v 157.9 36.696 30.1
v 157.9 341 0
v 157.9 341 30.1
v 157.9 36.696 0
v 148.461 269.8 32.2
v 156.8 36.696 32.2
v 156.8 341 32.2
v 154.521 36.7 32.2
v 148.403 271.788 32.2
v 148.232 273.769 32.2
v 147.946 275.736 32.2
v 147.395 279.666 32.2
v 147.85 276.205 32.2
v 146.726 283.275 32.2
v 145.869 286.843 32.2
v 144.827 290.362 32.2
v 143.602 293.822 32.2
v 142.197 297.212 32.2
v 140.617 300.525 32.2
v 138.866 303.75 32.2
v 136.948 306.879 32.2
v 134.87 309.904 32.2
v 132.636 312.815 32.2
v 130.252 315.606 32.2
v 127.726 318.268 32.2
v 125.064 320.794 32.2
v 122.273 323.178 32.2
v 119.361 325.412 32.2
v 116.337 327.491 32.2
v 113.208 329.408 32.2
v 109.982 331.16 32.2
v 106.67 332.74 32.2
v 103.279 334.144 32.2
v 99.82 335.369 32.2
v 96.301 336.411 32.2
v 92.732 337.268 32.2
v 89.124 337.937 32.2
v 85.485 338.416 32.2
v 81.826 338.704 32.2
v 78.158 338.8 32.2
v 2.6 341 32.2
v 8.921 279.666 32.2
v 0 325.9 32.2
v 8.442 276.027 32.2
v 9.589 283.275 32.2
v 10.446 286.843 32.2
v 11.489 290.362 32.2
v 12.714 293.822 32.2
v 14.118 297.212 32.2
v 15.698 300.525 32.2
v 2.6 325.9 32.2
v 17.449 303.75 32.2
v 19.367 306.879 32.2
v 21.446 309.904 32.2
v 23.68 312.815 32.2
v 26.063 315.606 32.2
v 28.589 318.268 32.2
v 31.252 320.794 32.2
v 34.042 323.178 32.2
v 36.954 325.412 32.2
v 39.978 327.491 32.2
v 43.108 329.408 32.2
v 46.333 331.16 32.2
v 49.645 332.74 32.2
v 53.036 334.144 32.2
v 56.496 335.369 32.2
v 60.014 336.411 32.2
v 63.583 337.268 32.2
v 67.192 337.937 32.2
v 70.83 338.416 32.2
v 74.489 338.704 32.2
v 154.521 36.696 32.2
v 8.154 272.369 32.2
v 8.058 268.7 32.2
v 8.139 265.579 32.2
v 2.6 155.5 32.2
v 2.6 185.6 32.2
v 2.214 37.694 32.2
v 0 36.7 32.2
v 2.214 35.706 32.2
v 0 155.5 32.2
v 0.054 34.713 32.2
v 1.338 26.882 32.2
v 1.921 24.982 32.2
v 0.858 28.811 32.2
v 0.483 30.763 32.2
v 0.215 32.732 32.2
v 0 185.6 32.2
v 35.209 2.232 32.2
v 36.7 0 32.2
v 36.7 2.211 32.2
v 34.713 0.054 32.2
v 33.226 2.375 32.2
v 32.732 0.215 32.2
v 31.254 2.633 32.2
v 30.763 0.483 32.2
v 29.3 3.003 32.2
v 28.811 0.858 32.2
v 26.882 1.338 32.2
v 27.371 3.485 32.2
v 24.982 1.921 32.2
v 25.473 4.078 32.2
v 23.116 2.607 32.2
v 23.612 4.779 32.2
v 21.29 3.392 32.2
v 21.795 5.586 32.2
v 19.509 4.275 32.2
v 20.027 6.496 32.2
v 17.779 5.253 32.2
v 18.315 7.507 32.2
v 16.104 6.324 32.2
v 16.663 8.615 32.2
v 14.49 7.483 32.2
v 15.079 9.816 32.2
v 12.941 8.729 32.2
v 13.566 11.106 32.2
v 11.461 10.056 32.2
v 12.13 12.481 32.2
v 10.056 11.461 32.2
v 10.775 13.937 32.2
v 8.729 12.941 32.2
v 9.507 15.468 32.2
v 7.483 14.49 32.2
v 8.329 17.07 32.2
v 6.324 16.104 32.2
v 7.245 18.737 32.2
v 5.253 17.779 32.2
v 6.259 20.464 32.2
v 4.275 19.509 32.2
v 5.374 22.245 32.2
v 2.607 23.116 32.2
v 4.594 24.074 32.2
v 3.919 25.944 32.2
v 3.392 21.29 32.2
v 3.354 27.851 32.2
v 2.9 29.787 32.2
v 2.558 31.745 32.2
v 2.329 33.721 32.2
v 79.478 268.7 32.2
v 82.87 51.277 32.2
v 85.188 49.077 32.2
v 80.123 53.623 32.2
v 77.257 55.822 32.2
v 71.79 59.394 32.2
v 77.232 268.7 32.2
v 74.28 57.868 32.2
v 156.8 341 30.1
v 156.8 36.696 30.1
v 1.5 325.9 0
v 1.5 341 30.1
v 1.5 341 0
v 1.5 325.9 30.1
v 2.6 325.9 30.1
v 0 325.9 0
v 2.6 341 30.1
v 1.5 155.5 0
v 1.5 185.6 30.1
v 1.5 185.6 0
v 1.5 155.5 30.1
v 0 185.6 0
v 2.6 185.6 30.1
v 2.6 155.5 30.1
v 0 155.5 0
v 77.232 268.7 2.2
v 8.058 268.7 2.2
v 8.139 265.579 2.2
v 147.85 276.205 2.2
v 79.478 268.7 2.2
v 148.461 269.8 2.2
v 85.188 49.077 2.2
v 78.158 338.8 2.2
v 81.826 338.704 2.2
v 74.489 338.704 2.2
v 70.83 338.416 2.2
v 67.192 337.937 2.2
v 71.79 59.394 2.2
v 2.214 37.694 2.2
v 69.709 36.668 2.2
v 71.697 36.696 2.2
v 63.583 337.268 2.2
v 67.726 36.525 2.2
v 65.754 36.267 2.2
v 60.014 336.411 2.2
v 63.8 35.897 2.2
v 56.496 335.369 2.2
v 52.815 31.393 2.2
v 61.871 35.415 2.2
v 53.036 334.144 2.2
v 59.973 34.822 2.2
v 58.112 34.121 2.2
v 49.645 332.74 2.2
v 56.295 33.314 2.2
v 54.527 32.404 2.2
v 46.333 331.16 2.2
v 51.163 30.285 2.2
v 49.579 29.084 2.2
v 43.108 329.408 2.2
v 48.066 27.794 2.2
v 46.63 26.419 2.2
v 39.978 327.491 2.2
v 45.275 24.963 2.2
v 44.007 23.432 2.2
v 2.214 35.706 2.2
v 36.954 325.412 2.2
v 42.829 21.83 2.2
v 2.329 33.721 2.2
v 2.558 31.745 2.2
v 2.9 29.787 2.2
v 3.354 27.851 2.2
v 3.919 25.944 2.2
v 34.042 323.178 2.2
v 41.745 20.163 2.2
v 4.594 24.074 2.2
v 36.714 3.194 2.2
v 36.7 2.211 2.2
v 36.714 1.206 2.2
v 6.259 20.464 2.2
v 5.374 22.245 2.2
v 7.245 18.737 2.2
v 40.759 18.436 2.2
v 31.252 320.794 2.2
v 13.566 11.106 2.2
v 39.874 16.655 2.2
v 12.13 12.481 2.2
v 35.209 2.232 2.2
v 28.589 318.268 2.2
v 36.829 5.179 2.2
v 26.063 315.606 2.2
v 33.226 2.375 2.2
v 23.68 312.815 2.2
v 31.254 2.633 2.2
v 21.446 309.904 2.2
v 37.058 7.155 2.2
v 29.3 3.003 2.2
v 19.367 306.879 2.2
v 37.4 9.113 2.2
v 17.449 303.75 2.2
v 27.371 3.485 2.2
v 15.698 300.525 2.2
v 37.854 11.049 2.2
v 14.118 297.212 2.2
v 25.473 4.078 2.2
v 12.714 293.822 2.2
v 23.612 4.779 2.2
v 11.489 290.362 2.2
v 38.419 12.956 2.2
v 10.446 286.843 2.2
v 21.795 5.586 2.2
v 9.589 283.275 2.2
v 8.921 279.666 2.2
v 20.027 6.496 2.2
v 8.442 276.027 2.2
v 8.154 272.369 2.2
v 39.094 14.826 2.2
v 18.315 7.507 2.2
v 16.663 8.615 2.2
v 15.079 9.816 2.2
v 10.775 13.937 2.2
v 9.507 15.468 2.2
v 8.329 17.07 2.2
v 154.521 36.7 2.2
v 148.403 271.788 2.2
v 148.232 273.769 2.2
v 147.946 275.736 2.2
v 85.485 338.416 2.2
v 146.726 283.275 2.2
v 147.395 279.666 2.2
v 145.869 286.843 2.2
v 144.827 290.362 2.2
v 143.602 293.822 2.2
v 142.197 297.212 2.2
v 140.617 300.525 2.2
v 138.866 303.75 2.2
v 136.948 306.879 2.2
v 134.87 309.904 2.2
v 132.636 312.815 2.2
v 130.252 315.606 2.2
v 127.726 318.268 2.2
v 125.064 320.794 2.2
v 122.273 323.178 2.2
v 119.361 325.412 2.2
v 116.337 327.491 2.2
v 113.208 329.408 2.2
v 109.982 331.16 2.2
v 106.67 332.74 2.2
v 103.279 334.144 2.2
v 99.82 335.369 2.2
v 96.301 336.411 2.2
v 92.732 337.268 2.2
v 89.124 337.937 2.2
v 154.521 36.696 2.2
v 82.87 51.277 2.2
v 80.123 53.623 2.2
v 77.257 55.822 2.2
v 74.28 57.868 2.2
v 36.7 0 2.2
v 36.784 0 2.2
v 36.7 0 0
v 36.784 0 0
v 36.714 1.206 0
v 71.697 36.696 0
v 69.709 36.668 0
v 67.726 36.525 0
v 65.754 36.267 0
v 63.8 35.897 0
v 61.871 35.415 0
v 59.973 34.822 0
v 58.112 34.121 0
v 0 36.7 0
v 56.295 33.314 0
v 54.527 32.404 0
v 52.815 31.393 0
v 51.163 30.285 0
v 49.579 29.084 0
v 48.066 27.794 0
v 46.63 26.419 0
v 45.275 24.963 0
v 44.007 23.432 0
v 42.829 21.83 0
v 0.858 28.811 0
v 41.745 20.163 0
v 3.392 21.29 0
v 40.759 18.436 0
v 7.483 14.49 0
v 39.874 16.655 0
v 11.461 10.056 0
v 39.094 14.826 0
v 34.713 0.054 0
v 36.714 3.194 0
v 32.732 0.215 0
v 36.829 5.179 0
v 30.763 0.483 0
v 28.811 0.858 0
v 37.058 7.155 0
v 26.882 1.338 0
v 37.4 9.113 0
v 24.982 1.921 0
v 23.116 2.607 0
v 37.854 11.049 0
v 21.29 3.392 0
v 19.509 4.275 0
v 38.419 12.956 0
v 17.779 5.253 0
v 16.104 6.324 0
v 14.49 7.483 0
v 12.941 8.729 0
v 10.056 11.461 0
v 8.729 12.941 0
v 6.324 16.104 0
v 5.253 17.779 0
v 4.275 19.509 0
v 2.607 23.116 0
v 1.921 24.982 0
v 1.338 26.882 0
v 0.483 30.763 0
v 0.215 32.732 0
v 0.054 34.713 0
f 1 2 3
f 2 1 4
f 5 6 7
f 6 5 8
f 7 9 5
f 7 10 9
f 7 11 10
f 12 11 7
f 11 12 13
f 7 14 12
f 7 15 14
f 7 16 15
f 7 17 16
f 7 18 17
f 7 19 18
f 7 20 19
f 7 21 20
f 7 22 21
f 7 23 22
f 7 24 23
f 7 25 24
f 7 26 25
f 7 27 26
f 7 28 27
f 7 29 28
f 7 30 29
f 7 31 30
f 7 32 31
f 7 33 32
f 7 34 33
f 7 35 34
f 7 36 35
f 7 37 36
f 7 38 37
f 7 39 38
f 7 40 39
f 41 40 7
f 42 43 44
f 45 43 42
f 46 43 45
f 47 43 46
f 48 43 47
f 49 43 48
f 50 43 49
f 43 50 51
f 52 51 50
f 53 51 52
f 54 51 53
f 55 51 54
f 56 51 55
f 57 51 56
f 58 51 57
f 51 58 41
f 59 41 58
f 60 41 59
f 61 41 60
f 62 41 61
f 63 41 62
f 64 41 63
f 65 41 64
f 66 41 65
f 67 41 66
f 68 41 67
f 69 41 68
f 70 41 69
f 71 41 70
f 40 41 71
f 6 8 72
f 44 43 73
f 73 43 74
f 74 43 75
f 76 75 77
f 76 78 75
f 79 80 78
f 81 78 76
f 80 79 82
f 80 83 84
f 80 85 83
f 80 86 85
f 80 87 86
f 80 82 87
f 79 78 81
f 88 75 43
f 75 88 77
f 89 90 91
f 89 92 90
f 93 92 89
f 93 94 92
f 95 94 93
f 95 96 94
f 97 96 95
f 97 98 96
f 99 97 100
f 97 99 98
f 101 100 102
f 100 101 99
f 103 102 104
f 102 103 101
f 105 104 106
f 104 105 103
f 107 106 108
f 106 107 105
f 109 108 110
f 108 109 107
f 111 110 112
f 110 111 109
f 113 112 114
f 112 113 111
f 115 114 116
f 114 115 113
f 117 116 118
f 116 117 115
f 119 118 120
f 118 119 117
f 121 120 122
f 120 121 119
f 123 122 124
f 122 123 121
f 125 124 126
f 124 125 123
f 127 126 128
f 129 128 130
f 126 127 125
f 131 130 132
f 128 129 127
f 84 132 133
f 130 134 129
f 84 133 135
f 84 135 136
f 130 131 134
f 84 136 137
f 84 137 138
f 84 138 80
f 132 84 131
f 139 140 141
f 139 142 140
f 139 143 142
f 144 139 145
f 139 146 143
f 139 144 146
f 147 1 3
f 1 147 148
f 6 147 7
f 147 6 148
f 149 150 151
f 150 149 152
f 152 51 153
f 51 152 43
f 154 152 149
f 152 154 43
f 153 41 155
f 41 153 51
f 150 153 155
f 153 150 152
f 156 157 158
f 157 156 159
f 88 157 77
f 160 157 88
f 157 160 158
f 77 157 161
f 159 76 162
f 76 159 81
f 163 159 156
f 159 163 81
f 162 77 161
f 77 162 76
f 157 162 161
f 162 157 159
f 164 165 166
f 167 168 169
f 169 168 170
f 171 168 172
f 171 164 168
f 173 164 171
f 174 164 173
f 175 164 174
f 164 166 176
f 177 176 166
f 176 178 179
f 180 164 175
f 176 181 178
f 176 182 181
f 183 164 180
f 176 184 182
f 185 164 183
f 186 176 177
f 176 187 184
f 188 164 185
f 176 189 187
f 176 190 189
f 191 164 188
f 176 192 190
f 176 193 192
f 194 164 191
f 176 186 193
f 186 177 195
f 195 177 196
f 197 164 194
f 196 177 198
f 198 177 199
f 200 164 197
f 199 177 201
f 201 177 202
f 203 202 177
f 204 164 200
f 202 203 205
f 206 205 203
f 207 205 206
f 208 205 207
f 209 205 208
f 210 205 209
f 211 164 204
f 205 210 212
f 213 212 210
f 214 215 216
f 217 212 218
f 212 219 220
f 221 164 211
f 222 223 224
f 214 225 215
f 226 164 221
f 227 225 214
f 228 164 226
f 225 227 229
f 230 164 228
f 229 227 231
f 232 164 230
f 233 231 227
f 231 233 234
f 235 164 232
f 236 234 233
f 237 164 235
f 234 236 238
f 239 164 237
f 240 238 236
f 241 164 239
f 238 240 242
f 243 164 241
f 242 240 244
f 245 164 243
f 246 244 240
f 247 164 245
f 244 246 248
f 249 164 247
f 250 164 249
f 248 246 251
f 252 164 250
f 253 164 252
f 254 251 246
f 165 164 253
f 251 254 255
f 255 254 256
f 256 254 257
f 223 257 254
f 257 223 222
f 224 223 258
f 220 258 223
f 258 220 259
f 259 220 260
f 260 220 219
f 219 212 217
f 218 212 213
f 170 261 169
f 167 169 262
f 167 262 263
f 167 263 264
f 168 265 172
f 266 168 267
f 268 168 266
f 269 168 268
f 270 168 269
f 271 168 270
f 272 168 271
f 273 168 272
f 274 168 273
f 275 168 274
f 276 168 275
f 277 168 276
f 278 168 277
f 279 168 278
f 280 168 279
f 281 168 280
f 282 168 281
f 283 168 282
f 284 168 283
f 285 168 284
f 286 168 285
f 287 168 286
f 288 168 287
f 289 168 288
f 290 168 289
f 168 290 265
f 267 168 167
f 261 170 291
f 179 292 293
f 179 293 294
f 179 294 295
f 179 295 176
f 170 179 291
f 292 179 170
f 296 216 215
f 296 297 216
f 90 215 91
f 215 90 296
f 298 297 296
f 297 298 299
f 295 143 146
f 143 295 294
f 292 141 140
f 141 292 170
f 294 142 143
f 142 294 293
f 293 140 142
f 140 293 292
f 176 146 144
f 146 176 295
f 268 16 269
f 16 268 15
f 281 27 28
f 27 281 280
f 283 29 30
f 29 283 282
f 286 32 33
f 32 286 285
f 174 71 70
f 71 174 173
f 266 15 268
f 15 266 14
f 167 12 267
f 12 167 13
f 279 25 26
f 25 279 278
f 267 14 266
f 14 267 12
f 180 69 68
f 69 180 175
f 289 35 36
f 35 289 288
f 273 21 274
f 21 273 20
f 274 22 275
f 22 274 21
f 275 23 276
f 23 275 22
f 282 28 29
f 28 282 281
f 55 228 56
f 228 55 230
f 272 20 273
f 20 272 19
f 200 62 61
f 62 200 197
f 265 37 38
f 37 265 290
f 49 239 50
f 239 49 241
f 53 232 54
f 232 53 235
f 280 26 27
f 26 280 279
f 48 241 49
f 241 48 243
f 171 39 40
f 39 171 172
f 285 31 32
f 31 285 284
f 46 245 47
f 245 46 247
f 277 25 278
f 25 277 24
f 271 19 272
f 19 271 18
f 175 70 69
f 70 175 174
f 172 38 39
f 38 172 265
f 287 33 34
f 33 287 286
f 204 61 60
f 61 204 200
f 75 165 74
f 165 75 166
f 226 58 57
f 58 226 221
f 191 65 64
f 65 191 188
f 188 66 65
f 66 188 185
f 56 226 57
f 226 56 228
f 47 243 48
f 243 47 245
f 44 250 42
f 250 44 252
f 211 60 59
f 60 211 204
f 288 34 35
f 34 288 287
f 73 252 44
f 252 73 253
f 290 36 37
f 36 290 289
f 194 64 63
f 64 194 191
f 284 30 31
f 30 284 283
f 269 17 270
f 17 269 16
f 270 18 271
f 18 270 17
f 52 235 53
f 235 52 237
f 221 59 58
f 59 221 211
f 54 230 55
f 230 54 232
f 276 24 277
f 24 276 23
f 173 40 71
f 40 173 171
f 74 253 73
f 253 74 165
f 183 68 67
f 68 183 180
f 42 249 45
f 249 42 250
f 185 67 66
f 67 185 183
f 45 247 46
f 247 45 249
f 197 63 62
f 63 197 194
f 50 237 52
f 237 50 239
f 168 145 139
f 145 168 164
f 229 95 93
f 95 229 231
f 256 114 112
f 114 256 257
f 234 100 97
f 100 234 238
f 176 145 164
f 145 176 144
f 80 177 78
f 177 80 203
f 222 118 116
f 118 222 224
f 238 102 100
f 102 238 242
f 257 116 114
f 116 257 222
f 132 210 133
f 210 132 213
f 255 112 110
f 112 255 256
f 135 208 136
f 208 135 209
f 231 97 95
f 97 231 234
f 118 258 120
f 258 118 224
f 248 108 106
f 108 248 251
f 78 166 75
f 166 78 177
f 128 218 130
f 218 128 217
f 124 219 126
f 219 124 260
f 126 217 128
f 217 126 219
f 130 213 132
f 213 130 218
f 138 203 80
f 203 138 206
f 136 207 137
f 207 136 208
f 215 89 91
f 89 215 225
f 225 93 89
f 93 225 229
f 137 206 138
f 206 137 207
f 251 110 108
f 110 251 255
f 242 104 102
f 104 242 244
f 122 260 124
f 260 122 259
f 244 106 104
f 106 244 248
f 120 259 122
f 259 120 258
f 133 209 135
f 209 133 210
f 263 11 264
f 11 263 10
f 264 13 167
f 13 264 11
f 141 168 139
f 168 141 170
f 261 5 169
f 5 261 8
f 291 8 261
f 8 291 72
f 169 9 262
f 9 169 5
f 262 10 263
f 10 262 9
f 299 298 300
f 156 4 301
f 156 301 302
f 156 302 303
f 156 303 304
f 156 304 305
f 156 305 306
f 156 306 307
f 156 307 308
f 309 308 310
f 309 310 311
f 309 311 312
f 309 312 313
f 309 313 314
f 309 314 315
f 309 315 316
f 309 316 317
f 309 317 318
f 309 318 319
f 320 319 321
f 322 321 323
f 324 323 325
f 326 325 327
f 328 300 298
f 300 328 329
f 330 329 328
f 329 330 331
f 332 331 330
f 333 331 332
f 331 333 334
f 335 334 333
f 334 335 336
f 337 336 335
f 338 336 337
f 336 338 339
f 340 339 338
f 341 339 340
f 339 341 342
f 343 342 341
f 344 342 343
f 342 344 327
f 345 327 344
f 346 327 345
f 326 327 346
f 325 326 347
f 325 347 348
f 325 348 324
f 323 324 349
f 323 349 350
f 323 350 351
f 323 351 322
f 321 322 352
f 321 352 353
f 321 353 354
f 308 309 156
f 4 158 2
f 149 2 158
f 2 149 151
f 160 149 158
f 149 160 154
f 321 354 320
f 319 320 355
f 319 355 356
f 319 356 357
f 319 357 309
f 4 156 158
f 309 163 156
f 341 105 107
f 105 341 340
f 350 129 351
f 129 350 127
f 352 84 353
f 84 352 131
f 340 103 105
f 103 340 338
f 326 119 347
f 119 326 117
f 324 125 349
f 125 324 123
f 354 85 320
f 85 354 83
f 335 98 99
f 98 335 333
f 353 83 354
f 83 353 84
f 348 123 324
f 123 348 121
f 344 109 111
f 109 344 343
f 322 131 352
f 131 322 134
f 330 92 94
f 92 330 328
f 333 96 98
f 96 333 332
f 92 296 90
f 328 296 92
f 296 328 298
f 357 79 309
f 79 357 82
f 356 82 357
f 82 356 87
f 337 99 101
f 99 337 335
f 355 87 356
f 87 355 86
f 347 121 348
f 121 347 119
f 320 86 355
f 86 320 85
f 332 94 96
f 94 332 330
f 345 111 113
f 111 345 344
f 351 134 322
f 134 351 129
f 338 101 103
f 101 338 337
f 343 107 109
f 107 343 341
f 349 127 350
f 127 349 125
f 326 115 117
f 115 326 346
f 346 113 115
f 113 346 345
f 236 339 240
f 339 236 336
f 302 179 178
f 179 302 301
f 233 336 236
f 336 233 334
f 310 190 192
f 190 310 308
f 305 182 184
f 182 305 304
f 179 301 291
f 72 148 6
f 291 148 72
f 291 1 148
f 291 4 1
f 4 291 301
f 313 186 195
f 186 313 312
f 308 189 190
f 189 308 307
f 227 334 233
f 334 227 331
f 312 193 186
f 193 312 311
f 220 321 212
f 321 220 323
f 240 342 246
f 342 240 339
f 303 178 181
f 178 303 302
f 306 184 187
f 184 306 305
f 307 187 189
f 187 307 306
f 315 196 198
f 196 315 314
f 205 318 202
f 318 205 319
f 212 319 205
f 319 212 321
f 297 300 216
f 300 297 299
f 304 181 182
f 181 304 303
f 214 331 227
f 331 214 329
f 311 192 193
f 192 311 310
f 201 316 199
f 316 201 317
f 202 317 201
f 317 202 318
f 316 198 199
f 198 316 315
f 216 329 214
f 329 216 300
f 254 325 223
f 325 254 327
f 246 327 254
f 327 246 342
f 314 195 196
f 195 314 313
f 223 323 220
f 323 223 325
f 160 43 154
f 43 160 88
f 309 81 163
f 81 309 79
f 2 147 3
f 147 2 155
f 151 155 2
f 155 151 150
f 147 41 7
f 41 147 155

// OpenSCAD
/*
FourOhFour
2018-03-08

License: http://creativecommons.org/licenses/by-sa/4.0/

A can dispenser for your fridge. Print two sides (mirror one in your slicer), one set of supports for the bottom, and a top shelf. Half sides and top provided if, like me, you don't have a large printer. If you aren't going to place items on top of the dispenser, you can save some plastic and replace the top shelf with another set of supports.

*/

/* [Can Dimensions] */
// Diameter of the can, mm
can_diameter = 67;

// Height of the can, mm
can_height = 123;

// How far from the edge should the can be supported, mm
can_support_height = 30;

/* [Dispenser Dimensions] */
// depth of dispenser, mm
depth = 341;

// height of dispenser, mm
height=160;

// how far from the front does the top shelf begin, mm
shelf_y = 100;

// which object?
part = "fullside"; // [fullside:Entire side piece, frontside:Front half of side, rearside:Rear half of side, supports, top, halftop:Half of top, topcutout:STL for slic3r to make top for full top mesh, halftopcutout:STL for top mesh for half top]

/* [Rear Notch] */
//notch out the bottom rear corner to avoid a rim on the fridge shelf?
should_notch_rear = false;
rear_notch_height = 33;
rear_notch_depth = 9;


/* [Nitpicky Details] */
// min wall thickness, mm
wall_thickness = 2.2;

// top shelf thickness, mm
top_thickness = 2;

// size of the bottom braces, mm
bottom_brace_width = 15;

// bottom brace thickness, mm
bottom_brace_thickness = 1.4;

// slope of ramps, percent
slope_angle = .026;

// extra space in assembly slots, mm
assembly_slack = .10;

// extra thickness for the middle of bottom braces and top, mm
brace_middle_addl_thickness = 1;

// how much should the thicker middle overlap the sides, mm
brace_middle_extra_width = 2;

// ammount to add to the size of the can, mm
slack = 2;

// render quality, lower better, min 0.01 def 12
$fa = 3;

track_radius = (can_diameter + slack) / 2;

module can_track(slope_dir) {
  y = depth - 3*track_radius - 2*wall_thickness;
  hull() {
    cylinder(h=can_support_height, r=track_radius);
    translate(
      [y * slope_angle * slope_dir,
      y,
      0]
    ) {
      cylinder(h=can_support_height+.1, r = track_radius);
      // adding some to height to make the preview render better
    }
  }
}

module support_inset(y, face) {
  thickness = (face==1 ? top_thickness : bottom_brace_thickness);
  translate([(face==1 ? 0 : -.1),0,-1]) cube(
    [thickness + assembly_slack+.1,
    y,
    can_support_height + wall_thickness+2]
  );
  translate([
    -face * assembly_slack - (face==1 ? brace_middle_addl_thickness : -thickness),
    0,
    can_support_height + wall_thickness - brace_middle_extra_width - assembly_slack
  ]) {
    cube([
      assembly_slack + brace_middle_addl_thickness,
      y,
      assembly_slack + brace_middle_extra_width
    ]);
  }
}

module support_piece(width, thickness) {
  support_length = can_height + slack;
  union() {
    cube([support_length + 2*wall_thickness, width, thickness]);
    translate([wall_thickness + can_support_height - brace_middle_extra_width, 0, thickness]) {
      cube([support_length - 2*can_support_height + 2*brace_middle_extra_width, width, brace_middle_addl_thickness]);
    }
  }
}

module finger_cutout() {
  translate([track_radius, -track_radius, -wall_thickness - .2]) {
    hull() {
      cylinder(h=can_support_height + 2*wall_thickness, r=track_radius);
      translate([height, 0, 0])
        cylinder(h=can_support_height + 2*wall_thickness, r=track_radius);
    }
  }
}

module can_path() {
  can_track(1); // lower track, slope up towards rear

  // cutout for can removal
  translate([0, -track_radius-wall_thickness,0]) {
    intersection() {
      cube([2*track_radius, 2*track_radius, can_support_height+.1]);
      cylinder(h=can_support_height + .1, r=2*track_radius);
    }
  }

  translate(
    [(depth - 3*track_radius - 2*wall_thickness) * slope_angle * 2 + 2*track_radius + wall_thickness,
    0,
    0]
  ) {
    /*translate([-(depth-track_radius)*slope_angle,track_radius,0])
      finger_cutout();*/
    can_track(-1); // upper track, slope down towards rear
  }

  // switchback
  translate(
    [(depth-2*track_radius-2*wall_thickness)*slope_angle+track_radius,
    depth-3*track_radius-2.5*wall_thickness,
    0]
  ) {
    difference() {
      // additional height so preview renders better
      cylinder(h=can_support_height+.1, r=2*track_radius + wall_thickness/2);
      translate([-2*track_radius,-2*track_radius-wall_thickness,-5]) {
        cube([4*track_radius,2*track_radius+wall_thickness,can_support_height+5],false);
      }
    }
  }
}

module dispenser_splitter() {
  translate([-1,-1,-1]) { // move away from origin so preview doesn't flicker
    midpoint_x = height/2 + 1; // account for the previous line
    midpoint_y = depth/2 + 1;
    linear_extrude(height = can_support_height + wall_thickness + 2) polygon(
      points = [
        [0,           0         ],
        [0,           midpoint_y],
        [midpoint_x,  midpoint_y],
        [midpoint_x,  midpoint_y - bottom_brace_width],
        [height+2,    midpoint_y - bottom_brace_width],
        [height+2,    0]
      ]
    );
  }
}

module can_dispenser() {
  difference() {
    cube([height,depth,can_support_height + wall_thickness]);

    // rear notch
    if(should_notch_rear) {
      translate([0, depth - rear_notch_depth,0]) {
        cube([rear_notch_height,rear_notch_depth,can_support_height+wall_thickness]);
      }
    }

    // slot for top shelf
    translate(
      [height - top_thickness - assembly_slack,
      track_radius + wall_thickness - .01,
      0]
    ) {
      support_inset(depth - track_radius - wall_thickness + .02, 1); //facing right
    }

    // slots for bottom braces
    translate(
      [0,
      depth - bottom_brace_width - assembly_slack - (should_notch_rear ? rear_notch_depth : 0),
      0]
    ) {
      support_inset(bottom_brace_width + assembly_slack+.1, -1);
    }
    translate(
      [0,
      depth / 2 - bottom_brace_width,
      0]
    ) {
      support_inset(2*bottom_brace_width + assembly_slack, -1);
    }

    // can path
    translate([track_radius+wall_thickness,track_radius+wall_thickness,wall_thickness]) {
      finger_cutout();
      can_path();

      // rounded lower corner
      translate([0,0,-wall_thickness])
        intersection() {
          translate([-2*track_radius,-2*track_radius,0])
            cube([track_radius*2,track_radius*2,can_support_height+wall_thickness]);
          difference() {
            cylinder(h=can_support_height+wall_thickness, r=2*track_radius);
            cylinder(h=can_support_height+wall_thickness, r=track_radius+wall_thickness);
          }
        }
    }
  }
}

if(part == "fullside" || part == "frontside" || part == "rearside") {
  // printing only half?
  if(part == "fullside") {
    can_dispenser();
  } else if(part == "frontside") {
    intersection() {
      can_dispenser();
      dispenser_splitter();
    }
  } else {
    difference() {
      can_dispenser();
      dispenser_splitter();
    }
  }
} else if(part == "supports") {
  support_piece(bottom_brace_width, bottom_brace_thickness);

  translate([0,bottom_brace_width + 5,0])
    support_piece(2*bottom_brace_width, bottom_brace_thickness);
} else if(part == "top") {
  support_piece(depth - track_radius - wall_thickness, top_thickness);
} else if(part == "halftop") {
  support_piece((depth - track_radius - wall_thickness)/2, top_thickness);
} else if(part=="topcutout") {
  translate([can_support_height + wall_thickness,0,0])
    cube([can_height + slack - 2*can_support_height, depth - track_radius - wall_thickness, top_thickness + brace_middle_addl_thickness]);
} else if(part=="halftopcutout") {
  translate([can_support_height + wall_thickness,0,0])
    cube([can_height + slack - 2*can_support_height, (depth - track_radius - wall_thickness)/2, top_thickness + brace_middle_addl_thickness]);
} else {
  translate([track_radius+wall_thickness,track_radius+wall_thickness,-(can_support_height/2)])
    can_path();
}
